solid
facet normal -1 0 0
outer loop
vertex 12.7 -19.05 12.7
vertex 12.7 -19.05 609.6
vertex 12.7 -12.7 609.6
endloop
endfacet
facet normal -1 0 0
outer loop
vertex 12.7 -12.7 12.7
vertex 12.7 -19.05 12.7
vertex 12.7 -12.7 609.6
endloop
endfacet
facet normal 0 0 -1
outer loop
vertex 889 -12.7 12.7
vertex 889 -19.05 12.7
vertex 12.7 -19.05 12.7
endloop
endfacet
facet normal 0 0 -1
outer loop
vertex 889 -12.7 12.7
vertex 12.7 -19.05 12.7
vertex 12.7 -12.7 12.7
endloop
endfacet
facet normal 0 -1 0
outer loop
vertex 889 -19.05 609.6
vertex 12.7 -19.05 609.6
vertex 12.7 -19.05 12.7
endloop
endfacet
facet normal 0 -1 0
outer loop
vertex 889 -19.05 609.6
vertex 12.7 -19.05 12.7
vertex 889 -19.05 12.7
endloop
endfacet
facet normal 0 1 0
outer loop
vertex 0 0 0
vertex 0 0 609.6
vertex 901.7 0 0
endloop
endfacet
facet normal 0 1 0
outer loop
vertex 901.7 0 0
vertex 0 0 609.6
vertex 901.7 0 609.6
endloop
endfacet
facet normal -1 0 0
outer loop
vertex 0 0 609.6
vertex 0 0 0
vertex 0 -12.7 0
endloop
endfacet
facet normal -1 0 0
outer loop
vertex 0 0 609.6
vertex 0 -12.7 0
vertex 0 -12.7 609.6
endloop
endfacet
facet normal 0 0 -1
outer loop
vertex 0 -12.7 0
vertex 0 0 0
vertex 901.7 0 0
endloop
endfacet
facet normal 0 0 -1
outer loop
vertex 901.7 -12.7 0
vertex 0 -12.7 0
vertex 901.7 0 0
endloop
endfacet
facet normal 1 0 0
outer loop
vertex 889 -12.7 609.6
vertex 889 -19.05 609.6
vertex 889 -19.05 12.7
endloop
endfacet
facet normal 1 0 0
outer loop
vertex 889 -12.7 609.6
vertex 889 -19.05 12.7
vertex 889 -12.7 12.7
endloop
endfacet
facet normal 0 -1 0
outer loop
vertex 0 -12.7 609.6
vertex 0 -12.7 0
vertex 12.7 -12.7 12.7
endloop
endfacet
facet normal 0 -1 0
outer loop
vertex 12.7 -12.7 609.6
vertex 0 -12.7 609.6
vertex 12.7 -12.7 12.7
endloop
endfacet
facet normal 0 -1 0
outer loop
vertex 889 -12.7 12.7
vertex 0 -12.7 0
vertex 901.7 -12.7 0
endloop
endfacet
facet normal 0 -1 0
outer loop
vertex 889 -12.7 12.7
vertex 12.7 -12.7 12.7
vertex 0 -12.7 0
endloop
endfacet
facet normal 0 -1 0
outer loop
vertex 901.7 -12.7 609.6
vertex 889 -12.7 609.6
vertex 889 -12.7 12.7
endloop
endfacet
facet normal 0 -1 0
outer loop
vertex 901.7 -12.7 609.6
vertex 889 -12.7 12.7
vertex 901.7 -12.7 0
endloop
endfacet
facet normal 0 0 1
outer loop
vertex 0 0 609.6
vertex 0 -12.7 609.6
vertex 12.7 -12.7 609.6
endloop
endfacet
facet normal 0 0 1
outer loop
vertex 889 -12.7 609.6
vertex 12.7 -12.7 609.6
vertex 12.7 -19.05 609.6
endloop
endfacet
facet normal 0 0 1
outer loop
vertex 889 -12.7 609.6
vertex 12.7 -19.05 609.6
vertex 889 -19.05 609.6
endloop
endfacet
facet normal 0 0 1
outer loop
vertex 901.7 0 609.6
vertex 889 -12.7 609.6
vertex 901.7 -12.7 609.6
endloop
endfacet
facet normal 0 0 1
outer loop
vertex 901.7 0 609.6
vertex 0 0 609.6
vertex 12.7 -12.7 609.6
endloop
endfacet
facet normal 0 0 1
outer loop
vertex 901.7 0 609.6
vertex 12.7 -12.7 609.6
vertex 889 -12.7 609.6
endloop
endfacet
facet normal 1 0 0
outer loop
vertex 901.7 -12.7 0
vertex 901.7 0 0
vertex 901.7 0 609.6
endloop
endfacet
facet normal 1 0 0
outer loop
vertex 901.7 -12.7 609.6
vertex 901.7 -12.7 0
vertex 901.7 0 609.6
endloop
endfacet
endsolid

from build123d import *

# Parameters (mm, degrees)
F0_W     = 901.7
F0_H     = 609.6
F1_DEPTH = 19.05
F2_W     = 12.7
F2_H     = 6.35
F3_DEPTH = 609.601
F4_W     = 6.35
F4_H     = 12.7
F5_DEPTH = 901.701


with BuildPart() as f1:
    # F0 (on Front) → F1 (new body)
    with BuildSketch(Plane.XZ):
        with Locations((450.85, 304.8)):
            Rectangle(F0_W, F0_H)
    extrude(amount=F1_DEPTH)

    # F2 (on face) → F3 (cut, through all)
    with BuildSketch(Plane.XY.offset(609.6)):
        with Locations((895.35, -15.875)):
            Rectangle(F2_W, F2_H)
        with Locations((6.35, -15.875)):
            Rectangle(F2_W, F2_H)
    extrude(amount=-F3_DEPTH, mode=Mode.SUBTRACT)

    # F4 (on face) → F5 (cut, through all)
    with BuildSketch(Plane.YZ.offset(901.7)):
        with Locations((-15.875, 6.35)):
            Rectangle(F4_W, F4_H)
    extrude(amount=-F5_DEPTH, mode=Mode.SUBTRACT)


solid = f1.part
